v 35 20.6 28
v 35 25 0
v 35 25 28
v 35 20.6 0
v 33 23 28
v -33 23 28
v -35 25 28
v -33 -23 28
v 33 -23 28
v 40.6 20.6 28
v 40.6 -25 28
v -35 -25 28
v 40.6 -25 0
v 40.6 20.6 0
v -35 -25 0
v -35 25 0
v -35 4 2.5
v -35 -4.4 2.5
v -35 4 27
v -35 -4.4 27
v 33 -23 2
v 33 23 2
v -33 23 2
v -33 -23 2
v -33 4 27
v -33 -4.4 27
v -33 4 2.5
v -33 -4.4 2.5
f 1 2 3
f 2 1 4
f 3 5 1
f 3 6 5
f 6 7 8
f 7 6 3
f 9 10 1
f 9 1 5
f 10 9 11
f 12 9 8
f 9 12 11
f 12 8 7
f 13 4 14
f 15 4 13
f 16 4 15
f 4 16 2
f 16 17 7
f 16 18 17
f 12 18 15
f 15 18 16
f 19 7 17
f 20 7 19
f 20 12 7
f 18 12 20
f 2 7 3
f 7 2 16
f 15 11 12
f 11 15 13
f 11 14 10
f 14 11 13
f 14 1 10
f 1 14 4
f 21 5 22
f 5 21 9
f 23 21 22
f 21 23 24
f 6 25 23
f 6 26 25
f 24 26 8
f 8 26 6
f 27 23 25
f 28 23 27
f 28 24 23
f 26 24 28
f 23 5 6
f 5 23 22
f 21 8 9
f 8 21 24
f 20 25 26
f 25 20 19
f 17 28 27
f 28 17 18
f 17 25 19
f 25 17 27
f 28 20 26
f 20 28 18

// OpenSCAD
// Two-part enclosure for small electronics board (e.g., Arduino-based logger)
// Print orientation: both parts on the bed, lid on the +X side, 10 mm gap

// ---------- Parameters ----------
box_x      = 70;    // box outer length (X)
box_y      = 50;    // box outer width (Y)
box_z      = 30;    // box outer height (Z)
box_wall   = 2;     // box wall thickness (sides and top)
box_floor  = 2;     // box floor thickness

lip_w      = 65.6;  // lid lip outer length (X)
lip_d      = 45.6;  // lid lip outer width (Y)
lip_h      = 4;     // lid lip height (extends above the open top)
lip_t      = 1.5;   // lid lip wall thickness

gap        = 10;    // gap between box and lid
eps        = 0.5;   // cutter overshoot past faces

$fn = 64;           // curve resolution (no curves here, set per the rules)

// ---------- Derived ----------
lip_r_pos  = lip_w  - 2 * box_wall;   // lip outer position relative to box centre (+X)
lip_r_neg  = lip_d  - 2 * box_wall;   // lip outer position relative to box centre (+Y)
clearance  = lip_r_pos - (box_x - 2 * box_wall) / 2;  // 0.2 mm clearance on each side
clearance_y= lip_r_neg - (box_y - 2 * box_wall) / 2;

// ---------- Model ----------
difference() {
    union() {
        // Part 1: Box (open top)
        translate([-box_x / 2, -box_y / 2, 0])
            cube([box_x, box_y, box_z - box_floor]);

        // Part 2: Lid, printed upside down.
        // Plate lies on the bed; the lip is on top of it, sliding into the opening.
        translate([-box_x / 2 + gap, -box_y / 2, 0])
            cube([lip_w, lip_d, box_z - box_floor]);
    }

    // Box interior (cut through the open top; side walls remain at box_wall)
    translate([-box_x / 2 + box_wall, -box_y / 2 + box_wall, box_floor])
        cube([box_x - 2 * box_wall, box_y - 2 * box_wall, box_z - box_floor + eps]);

    // Lip pocket: rectangular channel the lip slides into
    translate([-box_x / 2 + gap - lip_r_pos / 2,
               -box_y / 2 + box_wall + clearance_y,
               box_floor + eps])
        cube([lip_r_pos, lip_d - 2 * clearance_y,
              box_z - box_floor - lip_h + eps]);
}
